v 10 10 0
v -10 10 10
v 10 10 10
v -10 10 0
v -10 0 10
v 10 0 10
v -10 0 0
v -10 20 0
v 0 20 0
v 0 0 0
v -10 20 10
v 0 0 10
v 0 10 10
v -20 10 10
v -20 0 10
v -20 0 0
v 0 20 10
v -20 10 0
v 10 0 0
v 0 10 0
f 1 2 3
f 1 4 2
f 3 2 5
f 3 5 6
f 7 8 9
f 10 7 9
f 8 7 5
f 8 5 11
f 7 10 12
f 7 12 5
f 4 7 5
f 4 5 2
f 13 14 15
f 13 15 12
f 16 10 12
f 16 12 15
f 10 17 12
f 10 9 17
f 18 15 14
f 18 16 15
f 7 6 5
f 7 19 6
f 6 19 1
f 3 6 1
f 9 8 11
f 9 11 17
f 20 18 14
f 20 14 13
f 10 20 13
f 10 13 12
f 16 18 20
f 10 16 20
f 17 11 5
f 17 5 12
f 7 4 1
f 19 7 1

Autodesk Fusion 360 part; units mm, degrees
sketch "Sketch1" plane through (0, 0, 0) normal (0, 0, 1) x (1, 0, 0)
  line L0 (0, 0) -> (-10, 0)
  line L1 (-10, 0) -> (-10, 20)
  line L2 (-10, 20) -> (0, 20)
  line L3 (0, 20) -> (0, 0)
  line L4 (0, 0) -> (-20, 0)
  line L5 (-20, 0) -> (-20, 10)
  line L6 (-20, 10) -> (0, 10)
  line L7 (0, 10) -> (0, 0)
  line L8 (-10, 0) -> (10, 0)
  line L9 (10, 0) -> (10, 10)
  line L10 (10, 10) -> (-10, 10)
  line L11 (-10, 10) -> (-10, 0)
extrude "Extrude1" add sketch "Sketch1" along normal blind 10 contours L0 L1 L3 L4 L6 L7 L8 L10 L11 | L1 L4 L5 L6 L11 makes body 1
extrude "Extrude2" add sketch "Sketch1" along normal blind 10 separate body contours L0 L1 L3 L4 L6 L7 L8 L10 L11 | L1 L2 L3 L6 L10 makes body 2
extrude "Extrude3" add sketch "Sketch1" along normal blind 10 separate body contours L0 L1 L3 L4 L6 L7 L8 L10 L11 | L3 L7 L8 L9 L10 makes body 3
